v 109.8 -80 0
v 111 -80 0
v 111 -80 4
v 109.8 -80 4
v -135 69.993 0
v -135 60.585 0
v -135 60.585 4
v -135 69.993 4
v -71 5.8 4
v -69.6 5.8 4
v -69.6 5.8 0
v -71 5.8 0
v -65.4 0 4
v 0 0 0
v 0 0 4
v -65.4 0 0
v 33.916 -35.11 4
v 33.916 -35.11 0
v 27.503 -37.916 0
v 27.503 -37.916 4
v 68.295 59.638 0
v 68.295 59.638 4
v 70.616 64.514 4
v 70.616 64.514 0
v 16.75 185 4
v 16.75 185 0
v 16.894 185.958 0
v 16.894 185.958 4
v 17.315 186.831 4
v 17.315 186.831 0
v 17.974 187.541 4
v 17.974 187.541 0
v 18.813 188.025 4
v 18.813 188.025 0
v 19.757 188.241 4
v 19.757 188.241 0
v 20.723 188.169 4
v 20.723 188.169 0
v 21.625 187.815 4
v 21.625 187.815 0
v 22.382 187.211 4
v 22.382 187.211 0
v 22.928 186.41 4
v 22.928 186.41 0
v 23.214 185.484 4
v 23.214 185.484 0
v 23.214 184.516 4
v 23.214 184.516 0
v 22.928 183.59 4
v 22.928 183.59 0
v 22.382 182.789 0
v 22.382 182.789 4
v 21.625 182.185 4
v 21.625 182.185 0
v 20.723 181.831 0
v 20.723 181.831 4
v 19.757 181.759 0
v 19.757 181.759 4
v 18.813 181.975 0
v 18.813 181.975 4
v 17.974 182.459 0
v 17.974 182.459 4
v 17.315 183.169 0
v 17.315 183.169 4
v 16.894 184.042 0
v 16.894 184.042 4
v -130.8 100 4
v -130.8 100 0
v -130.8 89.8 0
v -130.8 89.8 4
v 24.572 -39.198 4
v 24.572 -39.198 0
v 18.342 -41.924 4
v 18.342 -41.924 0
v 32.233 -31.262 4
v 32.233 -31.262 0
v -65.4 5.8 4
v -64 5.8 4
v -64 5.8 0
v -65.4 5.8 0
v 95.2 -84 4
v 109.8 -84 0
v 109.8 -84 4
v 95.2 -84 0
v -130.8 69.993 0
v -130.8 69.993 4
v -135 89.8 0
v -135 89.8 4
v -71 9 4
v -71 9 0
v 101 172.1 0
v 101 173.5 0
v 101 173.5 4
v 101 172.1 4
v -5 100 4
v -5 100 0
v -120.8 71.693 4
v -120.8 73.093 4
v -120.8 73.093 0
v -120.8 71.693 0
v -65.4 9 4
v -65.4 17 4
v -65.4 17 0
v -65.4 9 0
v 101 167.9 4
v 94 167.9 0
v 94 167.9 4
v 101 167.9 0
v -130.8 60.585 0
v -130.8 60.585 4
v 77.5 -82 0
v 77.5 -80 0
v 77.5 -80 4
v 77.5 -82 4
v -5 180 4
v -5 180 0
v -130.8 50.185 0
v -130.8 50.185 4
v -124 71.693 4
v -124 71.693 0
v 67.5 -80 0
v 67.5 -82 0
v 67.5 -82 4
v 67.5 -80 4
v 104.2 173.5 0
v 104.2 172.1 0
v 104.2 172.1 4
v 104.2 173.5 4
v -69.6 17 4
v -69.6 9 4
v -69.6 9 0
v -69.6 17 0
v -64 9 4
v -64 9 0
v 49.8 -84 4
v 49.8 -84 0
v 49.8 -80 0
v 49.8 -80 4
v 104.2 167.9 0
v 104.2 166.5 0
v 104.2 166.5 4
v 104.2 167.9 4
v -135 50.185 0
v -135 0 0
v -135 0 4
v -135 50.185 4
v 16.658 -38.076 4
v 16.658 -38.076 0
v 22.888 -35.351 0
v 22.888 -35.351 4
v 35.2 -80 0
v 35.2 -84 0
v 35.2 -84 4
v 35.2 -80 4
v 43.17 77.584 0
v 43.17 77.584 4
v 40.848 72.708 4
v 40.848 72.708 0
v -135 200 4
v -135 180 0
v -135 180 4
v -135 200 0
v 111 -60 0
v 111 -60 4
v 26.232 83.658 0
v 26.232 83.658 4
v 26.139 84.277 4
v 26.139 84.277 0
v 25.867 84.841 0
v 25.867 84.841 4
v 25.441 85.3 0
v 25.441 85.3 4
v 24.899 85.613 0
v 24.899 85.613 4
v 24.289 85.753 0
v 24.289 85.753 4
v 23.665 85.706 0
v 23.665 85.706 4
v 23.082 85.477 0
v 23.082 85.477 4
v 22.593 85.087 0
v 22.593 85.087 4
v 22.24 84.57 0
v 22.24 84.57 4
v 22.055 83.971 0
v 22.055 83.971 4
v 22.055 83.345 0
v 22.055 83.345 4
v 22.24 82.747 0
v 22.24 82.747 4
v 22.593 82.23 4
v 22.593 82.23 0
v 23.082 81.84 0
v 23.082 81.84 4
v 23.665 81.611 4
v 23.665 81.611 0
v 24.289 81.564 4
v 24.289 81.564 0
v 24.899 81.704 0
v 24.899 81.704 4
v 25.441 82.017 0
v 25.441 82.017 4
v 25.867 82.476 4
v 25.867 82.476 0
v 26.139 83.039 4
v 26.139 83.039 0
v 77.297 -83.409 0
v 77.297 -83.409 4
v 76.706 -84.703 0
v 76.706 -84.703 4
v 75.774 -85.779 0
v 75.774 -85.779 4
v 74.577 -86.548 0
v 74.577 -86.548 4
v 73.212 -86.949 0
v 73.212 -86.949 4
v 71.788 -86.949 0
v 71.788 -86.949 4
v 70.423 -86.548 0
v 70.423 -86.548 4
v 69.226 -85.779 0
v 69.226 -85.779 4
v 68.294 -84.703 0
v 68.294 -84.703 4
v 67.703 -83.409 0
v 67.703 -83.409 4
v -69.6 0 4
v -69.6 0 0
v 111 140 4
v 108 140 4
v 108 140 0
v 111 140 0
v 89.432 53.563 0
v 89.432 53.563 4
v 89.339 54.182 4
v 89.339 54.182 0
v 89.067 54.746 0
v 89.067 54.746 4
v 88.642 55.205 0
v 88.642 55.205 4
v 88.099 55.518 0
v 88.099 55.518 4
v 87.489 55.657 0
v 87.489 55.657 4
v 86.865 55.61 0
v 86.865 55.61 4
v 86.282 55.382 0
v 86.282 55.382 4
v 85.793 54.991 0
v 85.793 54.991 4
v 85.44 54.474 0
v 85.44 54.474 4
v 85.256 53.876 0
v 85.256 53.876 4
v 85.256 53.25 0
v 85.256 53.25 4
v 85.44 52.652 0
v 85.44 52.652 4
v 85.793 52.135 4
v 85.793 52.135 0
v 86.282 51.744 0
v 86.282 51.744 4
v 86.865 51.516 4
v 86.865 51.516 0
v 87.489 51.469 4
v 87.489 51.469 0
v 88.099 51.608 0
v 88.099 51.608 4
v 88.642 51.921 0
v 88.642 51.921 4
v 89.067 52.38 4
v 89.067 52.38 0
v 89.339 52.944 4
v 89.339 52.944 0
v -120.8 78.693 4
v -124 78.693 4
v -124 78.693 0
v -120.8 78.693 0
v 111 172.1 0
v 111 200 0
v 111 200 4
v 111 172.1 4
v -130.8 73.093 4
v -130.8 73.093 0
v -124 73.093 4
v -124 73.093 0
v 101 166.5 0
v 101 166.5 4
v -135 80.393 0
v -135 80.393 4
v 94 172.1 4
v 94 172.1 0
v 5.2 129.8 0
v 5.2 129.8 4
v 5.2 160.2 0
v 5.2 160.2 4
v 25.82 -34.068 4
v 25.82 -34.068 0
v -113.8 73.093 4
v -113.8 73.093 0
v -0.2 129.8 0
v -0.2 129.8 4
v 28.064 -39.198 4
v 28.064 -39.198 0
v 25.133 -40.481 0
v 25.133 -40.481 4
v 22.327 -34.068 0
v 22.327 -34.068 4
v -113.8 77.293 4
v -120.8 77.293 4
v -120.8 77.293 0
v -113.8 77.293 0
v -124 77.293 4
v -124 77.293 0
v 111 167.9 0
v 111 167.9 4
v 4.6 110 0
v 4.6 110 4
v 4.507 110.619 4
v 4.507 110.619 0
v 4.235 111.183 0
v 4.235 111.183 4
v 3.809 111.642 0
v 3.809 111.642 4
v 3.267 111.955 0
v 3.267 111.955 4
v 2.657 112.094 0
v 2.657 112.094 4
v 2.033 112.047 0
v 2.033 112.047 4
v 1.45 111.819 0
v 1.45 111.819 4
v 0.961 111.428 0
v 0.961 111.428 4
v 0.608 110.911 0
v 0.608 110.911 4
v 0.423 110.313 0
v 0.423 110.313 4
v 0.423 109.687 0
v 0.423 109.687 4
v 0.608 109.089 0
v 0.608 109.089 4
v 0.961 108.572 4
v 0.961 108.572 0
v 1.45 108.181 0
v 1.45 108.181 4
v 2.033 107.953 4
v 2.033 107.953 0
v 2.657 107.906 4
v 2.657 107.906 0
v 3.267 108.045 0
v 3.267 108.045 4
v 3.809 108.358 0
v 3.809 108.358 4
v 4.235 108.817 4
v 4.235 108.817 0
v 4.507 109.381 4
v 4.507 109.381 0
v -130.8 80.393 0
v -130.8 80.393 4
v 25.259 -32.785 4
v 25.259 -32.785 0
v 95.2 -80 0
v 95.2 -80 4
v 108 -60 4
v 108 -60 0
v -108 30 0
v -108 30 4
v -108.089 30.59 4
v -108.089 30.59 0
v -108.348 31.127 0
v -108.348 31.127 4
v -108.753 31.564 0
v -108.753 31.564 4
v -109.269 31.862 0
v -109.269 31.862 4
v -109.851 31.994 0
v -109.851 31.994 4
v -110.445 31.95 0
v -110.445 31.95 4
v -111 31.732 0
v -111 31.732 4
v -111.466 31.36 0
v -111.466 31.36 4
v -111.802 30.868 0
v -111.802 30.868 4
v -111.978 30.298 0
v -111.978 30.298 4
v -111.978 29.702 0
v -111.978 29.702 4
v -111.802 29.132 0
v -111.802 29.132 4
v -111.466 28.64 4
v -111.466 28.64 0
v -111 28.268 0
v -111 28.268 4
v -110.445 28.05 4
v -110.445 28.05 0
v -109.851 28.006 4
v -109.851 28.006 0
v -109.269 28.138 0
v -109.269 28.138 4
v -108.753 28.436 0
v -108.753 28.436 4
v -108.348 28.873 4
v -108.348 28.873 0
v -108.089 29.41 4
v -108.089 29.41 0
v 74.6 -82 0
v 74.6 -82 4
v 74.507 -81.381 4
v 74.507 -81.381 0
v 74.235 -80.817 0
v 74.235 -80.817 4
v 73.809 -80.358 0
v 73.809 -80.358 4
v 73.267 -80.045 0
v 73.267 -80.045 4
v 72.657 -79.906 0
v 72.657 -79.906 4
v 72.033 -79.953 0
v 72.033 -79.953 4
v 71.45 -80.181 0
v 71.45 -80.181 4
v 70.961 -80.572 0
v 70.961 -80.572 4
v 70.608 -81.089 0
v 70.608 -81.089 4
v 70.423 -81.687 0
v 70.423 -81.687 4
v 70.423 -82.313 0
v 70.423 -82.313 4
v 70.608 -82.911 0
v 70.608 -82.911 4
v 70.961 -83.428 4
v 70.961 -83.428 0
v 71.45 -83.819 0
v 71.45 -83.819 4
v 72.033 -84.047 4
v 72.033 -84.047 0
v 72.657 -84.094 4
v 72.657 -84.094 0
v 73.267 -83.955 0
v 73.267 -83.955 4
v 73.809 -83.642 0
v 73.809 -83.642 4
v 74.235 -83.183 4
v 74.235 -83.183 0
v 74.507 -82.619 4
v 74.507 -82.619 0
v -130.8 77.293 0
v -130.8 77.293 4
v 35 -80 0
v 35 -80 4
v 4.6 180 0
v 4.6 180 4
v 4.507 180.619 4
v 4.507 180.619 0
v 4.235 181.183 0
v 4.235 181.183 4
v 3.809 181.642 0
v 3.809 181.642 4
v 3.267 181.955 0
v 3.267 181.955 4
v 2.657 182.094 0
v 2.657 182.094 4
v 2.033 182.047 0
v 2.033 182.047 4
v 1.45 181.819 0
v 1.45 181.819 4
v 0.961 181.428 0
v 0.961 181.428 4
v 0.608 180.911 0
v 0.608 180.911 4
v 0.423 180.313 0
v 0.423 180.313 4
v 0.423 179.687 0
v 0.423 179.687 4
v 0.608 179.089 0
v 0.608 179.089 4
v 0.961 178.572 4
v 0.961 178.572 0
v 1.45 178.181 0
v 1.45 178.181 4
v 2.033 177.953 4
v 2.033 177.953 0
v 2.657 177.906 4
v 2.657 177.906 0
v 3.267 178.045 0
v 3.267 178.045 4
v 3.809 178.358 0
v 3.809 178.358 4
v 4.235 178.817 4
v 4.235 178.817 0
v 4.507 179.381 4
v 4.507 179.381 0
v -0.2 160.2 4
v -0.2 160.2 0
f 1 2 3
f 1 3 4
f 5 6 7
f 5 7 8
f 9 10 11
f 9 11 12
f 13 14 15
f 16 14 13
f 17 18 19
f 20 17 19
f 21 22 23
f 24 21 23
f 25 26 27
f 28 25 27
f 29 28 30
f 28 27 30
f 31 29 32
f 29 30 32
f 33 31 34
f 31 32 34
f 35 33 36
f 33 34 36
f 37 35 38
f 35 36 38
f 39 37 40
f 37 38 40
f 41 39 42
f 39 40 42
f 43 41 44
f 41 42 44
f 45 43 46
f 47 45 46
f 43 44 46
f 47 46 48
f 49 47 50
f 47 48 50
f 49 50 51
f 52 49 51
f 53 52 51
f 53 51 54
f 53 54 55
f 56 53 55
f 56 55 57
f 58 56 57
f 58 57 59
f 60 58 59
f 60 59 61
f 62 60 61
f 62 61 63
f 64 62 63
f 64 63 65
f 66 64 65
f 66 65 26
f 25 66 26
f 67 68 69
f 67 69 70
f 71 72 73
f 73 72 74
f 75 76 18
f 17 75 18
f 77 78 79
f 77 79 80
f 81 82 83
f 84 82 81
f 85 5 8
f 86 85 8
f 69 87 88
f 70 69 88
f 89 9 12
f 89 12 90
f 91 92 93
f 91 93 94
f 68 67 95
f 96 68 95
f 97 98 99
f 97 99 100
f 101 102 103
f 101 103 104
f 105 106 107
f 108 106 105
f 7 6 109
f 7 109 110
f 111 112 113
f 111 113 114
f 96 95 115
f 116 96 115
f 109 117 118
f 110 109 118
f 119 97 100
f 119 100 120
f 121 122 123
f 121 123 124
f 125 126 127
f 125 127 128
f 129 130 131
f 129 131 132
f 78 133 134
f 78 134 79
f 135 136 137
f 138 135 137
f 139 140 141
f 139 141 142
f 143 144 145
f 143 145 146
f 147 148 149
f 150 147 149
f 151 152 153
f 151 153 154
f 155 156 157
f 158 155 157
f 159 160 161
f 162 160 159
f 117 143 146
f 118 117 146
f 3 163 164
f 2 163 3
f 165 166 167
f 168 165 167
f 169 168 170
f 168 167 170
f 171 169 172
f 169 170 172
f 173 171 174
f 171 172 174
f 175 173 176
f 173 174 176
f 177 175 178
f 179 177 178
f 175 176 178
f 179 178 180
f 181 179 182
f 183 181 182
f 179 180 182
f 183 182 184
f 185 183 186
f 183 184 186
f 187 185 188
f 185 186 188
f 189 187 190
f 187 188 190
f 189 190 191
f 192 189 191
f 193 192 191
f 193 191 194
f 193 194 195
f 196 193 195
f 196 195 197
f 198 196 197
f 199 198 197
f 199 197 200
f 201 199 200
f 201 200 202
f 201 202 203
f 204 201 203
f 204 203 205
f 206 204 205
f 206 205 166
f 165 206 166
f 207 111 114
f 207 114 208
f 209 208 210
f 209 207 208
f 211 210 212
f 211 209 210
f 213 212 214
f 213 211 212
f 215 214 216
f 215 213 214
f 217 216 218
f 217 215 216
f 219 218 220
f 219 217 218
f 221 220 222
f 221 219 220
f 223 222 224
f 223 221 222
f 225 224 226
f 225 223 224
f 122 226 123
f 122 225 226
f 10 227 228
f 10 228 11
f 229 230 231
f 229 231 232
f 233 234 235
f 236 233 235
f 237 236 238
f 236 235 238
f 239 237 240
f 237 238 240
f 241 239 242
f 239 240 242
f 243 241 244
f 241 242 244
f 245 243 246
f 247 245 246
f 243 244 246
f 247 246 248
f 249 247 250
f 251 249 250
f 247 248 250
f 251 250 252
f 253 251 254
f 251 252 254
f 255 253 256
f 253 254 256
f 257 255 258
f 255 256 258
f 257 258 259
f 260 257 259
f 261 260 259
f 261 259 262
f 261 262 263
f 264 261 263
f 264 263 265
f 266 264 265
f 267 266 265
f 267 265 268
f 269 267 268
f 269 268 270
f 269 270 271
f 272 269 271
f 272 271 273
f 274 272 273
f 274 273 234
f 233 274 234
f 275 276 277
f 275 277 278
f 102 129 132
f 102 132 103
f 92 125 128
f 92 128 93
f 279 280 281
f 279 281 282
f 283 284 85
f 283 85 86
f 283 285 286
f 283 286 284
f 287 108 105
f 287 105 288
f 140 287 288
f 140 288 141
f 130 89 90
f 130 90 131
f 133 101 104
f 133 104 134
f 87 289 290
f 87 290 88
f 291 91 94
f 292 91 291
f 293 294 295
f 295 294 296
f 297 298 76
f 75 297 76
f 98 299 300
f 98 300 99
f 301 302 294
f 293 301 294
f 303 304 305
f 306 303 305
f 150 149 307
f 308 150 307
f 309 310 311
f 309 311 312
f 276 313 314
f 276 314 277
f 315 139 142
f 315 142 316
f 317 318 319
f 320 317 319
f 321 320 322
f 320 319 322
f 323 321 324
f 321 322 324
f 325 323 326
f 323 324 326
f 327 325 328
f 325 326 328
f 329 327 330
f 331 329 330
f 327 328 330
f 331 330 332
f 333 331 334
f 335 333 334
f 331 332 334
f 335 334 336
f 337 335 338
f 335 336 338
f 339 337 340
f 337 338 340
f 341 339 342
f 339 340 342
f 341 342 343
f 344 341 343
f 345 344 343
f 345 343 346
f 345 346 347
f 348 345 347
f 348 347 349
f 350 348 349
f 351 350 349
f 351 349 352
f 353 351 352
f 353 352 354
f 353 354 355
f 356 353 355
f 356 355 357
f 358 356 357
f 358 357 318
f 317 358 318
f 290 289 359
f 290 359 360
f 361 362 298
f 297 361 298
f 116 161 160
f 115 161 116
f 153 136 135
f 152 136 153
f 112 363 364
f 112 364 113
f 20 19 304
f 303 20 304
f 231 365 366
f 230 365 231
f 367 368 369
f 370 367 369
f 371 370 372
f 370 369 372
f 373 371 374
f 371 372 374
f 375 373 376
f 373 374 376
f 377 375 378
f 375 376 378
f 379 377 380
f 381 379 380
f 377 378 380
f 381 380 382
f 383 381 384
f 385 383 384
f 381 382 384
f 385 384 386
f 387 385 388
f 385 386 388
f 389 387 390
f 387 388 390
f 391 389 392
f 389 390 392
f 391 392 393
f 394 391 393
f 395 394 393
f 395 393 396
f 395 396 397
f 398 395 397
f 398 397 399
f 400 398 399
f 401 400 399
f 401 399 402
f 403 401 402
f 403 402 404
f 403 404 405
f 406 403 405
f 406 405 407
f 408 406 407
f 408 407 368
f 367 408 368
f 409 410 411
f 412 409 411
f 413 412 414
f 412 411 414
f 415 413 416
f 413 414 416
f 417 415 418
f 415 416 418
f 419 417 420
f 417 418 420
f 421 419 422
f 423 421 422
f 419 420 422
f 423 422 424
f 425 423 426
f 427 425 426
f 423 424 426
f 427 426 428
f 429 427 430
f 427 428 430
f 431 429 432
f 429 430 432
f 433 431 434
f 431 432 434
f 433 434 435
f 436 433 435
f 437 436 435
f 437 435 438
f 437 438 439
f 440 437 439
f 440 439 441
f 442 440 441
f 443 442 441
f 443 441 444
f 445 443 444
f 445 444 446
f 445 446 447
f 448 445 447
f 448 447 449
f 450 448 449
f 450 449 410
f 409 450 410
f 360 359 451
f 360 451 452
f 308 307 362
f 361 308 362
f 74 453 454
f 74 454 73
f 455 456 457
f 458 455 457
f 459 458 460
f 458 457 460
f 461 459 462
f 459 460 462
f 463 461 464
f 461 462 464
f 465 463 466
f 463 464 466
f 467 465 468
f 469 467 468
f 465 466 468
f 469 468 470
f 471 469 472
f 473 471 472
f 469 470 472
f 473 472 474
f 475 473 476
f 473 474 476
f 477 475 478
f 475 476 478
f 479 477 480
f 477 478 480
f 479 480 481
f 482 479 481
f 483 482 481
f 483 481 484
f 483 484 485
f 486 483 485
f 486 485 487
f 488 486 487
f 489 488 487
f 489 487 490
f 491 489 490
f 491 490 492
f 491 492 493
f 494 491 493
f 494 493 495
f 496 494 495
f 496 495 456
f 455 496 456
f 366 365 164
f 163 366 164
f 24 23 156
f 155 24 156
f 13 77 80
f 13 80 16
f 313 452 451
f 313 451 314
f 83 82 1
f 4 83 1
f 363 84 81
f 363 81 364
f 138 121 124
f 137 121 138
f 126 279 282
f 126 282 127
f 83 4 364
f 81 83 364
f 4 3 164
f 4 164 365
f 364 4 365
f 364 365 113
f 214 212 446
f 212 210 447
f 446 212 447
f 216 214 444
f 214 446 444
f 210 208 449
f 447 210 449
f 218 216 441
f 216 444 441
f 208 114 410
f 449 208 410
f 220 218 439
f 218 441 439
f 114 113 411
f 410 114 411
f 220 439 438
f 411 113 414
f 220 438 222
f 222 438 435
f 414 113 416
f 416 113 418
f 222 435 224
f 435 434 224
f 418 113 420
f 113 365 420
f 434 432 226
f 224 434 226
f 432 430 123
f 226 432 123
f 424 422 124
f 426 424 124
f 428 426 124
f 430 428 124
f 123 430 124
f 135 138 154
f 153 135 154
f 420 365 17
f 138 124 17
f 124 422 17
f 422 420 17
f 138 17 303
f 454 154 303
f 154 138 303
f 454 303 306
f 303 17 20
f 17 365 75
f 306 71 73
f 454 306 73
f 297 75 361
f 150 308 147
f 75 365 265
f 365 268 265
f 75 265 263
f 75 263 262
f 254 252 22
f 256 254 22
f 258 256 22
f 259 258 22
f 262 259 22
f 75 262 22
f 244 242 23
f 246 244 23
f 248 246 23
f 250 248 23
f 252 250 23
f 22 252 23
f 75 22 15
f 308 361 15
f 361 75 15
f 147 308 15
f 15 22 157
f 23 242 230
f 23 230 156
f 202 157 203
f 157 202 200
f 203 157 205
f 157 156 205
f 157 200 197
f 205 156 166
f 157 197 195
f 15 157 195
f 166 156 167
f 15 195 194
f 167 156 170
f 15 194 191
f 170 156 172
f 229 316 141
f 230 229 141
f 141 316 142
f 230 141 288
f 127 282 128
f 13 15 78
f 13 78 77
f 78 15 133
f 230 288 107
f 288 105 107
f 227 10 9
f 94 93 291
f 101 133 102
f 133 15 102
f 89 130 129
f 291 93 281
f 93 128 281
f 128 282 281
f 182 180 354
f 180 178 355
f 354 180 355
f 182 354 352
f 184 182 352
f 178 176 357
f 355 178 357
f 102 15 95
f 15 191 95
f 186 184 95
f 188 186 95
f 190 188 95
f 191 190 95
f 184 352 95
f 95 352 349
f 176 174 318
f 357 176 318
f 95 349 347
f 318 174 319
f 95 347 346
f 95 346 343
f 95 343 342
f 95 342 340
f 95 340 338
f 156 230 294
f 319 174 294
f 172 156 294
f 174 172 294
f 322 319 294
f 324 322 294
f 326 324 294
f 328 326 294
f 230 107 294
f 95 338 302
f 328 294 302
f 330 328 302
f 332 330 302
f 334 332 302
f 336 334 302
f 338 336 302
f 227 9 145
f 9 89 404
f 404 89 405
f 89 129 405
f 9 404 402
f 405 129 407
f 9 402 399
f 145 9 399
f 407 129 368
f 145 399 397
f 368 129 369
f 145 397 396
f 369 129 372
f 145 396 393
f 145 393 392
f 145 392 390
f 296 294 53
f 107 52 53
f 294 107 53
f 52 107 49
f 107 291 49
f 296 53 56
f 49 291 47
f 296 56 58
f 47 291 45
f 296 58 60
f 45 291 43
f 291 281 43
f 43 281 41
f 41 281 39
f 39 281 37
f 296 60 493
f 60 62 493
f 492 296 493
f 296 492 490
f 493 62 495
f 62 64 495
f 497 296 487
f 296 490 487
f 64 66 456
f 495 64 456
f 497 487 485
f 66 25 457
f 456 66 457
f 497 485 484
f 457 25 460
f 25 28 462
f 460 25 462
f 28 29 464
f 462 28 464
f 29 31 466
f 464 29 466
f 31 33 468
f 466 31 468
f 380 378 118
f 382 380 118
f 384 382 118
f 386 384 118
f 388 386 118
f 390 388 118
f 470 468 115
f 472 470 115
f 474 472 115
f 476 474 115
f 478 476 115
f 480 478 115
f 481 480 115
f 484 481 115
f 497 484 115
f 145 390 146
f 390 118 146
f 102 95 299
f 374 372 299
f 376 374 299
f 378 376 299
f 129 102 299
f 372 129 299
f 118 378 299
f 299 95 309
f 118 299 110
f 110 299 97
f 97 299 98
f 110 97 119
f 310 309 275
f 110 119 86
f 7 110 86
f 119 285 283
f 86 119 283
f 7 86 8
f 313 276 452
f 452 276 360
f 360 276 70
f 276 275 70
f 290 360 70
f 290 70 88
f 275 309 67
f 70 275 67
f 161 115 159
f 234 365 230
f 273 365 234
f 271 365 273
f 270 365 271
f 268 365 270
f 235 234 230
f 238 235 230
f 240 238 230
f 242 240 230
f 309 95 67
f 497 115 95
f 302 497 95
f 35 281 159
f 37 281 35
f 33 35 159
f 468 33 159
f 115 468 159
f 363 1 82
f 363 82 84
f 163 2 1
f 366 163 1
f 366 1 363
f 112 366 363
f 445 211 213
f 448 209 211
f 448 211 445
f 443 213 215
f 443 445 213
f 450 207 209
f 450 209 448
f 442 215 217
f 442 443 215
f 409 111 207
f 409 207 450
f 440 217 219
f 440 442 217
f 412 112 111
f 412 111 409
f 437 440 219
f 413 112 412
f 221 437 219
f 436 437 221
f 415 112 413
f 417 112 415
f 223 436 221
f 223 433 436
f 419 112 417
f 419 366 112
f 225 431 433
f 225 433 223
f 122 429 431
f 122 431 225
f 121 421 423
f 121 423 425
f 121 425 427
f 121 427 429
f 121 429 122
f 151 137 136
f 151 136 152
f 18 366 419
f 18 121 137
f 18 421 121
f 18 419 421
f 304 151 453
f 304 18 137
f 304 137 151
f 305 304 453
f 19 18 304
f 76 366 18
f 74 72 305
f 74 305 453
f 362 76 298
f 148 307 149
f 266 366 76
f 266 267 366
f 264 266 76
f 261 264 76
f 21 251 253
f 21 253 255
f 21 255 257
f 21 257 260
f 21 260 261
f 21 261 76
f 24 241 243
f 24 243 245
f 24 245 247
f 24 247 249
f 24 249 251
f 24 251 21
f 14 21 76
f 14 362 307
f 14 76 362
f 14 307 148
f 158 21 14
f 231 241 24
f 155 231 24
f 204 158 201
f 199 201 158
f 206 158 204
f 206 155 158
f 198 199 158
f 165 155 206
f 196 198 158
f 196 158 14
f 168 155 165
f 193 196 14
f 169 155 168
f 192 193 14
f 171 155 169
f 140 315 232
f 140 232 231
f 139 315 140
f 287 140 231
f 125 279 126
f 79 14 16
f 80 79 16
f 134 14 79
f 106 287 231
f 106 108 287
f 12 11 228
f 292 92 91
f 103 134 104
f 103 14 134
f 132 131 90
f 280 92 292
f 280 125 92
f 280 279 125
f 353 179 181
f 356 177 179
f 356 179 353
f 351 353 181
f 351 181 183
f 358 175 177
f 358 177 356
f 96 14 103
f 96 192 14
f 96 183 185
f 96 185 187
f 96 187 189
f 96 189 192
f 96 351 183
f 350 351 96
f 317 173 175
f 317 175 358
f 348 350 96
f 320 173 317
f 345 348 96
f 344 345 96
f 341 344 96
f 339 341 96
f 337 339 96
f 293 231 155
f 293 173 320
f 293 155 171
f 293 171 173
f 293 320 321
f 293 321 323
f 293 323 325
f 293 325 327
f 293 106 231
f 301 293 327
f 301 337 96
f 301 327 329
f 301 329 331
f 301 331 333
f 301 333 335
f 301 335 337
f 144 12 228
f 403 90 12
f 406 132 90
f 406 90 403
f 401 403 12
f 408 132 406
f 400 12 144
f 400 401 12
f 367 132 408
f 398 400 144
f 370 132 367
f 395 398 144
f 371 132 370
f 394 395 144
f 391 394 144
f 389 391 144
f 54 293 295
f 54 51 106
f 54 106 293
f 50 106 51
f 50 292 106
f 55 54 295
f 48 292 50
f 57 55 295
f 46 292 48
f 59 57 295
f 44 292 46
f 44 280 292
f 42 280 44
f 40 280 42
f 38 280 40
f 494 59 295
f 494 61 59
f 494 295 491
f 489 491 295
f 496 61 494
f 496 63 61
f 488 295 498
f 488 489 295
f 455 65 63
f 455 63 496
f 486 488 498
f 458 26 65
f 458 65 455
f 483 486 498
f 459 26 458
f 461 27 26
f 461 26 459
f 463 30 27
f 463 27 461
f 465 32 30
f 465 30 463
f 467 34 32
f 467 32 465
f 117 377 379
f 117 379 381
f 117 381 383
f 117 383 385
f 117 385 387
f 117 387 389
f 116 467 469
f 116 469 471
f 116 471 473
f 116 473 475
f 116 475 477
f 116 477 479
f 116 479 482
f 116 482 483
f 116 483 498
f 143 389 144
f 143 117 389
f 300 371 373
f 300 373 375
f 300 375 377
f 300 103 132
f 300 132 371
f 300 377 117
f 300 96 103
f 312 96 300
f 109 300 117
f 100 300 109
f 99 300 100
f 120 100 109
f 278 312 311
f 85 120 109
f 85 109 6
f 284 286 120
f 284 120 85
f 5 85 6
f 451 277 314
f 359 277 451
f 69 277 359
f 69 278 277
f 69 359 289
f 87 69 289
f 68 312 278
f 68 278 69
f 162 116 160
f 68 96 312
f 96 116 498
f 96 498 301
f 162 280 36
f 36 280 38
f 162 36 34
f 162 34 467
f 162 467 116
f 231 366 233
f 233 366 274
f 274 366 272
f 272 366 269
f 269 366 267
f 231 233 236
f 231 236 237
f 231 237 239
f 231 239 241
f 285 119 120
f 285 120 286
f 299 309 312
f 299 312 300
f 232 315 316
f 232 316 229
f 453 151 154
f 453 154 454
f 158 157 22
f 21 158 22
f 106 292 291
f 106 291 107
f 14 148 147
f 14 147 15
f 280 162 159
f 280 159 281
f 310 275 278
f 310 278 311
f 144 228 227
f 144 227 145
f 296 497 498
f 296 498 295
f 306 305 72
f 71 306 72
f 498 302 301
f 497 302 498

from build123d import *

# Parameters (mm, degrees)
BOSS_EXTRU_1_DEPTH       = 4
ESQUISSE2_W              = 130
ESQUISSE2_H              = 80
ENL_V_MAT_EXTRU_1_DEPTH  = 242.33172191
ESQUISSE3_W              = 3
ESQUISSE3_H              = 200
ENL_V_MAT_EXTRU_2_DEPTH  = 242.33172191
ESQUISSE4_R              = 2.1
ENL_V_MAT_EXTRU_3_DEPTH  = 242.33172191
ESQUISSE5_R              = 2
ENL_V_MAT_EXTRU_4_DEPTH  = 242.33172191
ESQUISSE7_R              = 3.25
ENL_V_MAT_EXTRU_6_DEPTH  = 242.33172191
ESQUISSE8_W              = 5.4
ESQUISSE8_H              = 30.4
ENL_V_MAT_EXTRU_7_DEPTH  = 242.33172191
ESQUISSE9_W              = 4.4
ESQUISSE9_H              = 10.4
ENL_V_MAT_EXTRU_8_DEPTH  = 4.2
ENL_V_MAT_EXTRU_9_DEPTH  = 242.33172191
ESQUISSE12_W             = 14.6
ESQUISSE12_H             = 4
BOSS_EXTRU_2_DEPTH       = 4
ENL_V_MAT_EXTRU_10_DEPTH = 242.33172191
ENL_V_MAT_EXTRU_11_DEPTH = 242.33172191
ENL_V_MAT_EXTRU_12_DEPTH = 242.33172191
ESQUISSE16_R             = 2.1
ENL_V_MAT_EXTRU_13_DEPTH = 242.33172191


with BuildPart() as part:
    # Esquisse1 → Boss.-Extru.1 (new body)
    with BuildSketch(Plane.XY):
        Polygon((0, 0), (-135, 0), (-135, 200), (111, 200), (111, -80), (35, -80), align=None)
    extrude(amount=BOSS_EXTRU_1_DEPTH)

    # Esquisse2 → Enlèv. mat.-Extru.1 (cut, through all)
    with BuildSketch(Plane.XY.offset(4)):
        with Locations((-70, 140)):
            Rectangle(ESQUISSE2_W, ESQUISSE2_H)
    extrude(amount=-ENL_V_MAT_EXTRU_1_DEPTH, mode=Mode.SUBTRACT)

    # Esquisse3 → Enlèv. mat.-Extru.2 (cut, through all)
    with BuildSketch(Plane.XY.offset(4)):
        with Locations((109.5, 40)):
            Rectangle(ESQUISSE3_W, ESQUISSE3_H)
    extrude(amount=-ENL_V_MAT_EXTRU_2_DEPTH, mode=Mode.SUBTRACT)

    # Esquisse4 → Enlèv. mat.-Extru.3 (cut, through all)
    with BuildSketch(Plane.XY.offset(4)):
        with Locations((24.132044328, 83.658479689)):
            Circle(ESQUISSE4_R)
        with Locations((87.332280645, 53.563129062)):
            Circle(ESQUISSE4_R)
        with Locations((2.5, 110)):
            Circle(ESQUISSE4_R)
        with Locations((2.5, 180)):
            Circle(ESQUISSE4_R)
    extrude(amount=-ENL_V_MAT_EXTRU_3_DEPTH, mode=Mode.SUBTRACT)

    # Esquisse5 → Enlèv. mat.-Extru.4 (cut, through all)
    with BuildSketch(Plane.XY.offset(4)):
        with Locations((-110, 30)):
            Circle(ESQUISSE5_R)
    extrude(amount=-ENL_V_MAT_EXTRU_4_DEPTH, mode=Mode.SUBTRACT)

    # Esquisse7 → Enlèv. mat.-Extru.6 (cut, through all)
    with BuildSketch(Plane(origin=(0, 0, 0), x_dir=(-1, 0, 0), z_dir=(0, 0, -1))):
        with Locations((-20, 185)):
            Circle(ESQUISSE7_R)
    extrude(amount=-ENL_V_MAT_EXTRU_6_DEPTH, mode=Mode.SUBTRACT)

    # Esquisse8 → Enlèv. mat.-Extru.7 (cut, through all)
    with BuildSketch(Plane.XY.offset(4)):
        with Locations((2.5, 145)):
            Rectangle(ESQUISSE8_W, ESQUISSE8_H)
        Polygon((68.294821705, 59.638090553), (70.616463039, 64.513537354), (43.169503267, 77.583518198), (40.847861933, 72.708071397), align=None)
    extrude(amount=-ENL_V_MAT_EXTRU_7_DEPTH, mode=Mode.SUBTRACT)

    # Esquisse9 → Enlèv. mat.-Extru.8 (cut)
    with BuildSketch(Plane.ZY.offset(135)):
        with Locations((2, 95)):
            Rectangle(ESQUISSE9_W, ESQUISSE9_H)
        with Locations((2, 55.385186032)):
            Rectangle(ESQUISSE9_W, ESQUISSE9_H)
        with Locations((2, 75.192593016)):
            Rectangle(ESQUISSE9_W, ESQUISSE9_H)
    extrude(amount=-ENL_V_MAT_EXTRU_8_DEPTH, mode=Mode.SUBTRACT)

    # Esquisse10 → Enlèv. mat.-Extru.9 (cut, through all)
    with BuildSketch(Plane.XY.offset(4)):
        Polygon((-130.8, 77.292593016), (-124, 77.292593016), (-124, 78.692593016), (-120.8, 78.692593016), (-120.8, 77.292593016), (-113.8, 77.292593016), (-113.8, 73.092593016), (-120.8, 73.092593016), (-120.8, 71.692593016), (-124, 71.692593016), (-124, 73.092593016), (-130.8, 73.092593016), align=None)
    extrude(amount=-ENL_V_MAT_EXTRU_9_DEPTH, mode=Mode.SUBTRACT)

    # Esquisse12 → Boss.-Extru.2 (add)
    with BuildSketch(Plane(origin=(0, 0, 0), x_dir=(-1, 0, 0), z_dir=(0, 0, -1))):
        with Locations((-42.5, -82)):
            Rectangle(ESQUISSE12_W, ESQUISSE12_H)
        with Locations((-102.5, -82)):
            Rectangle(ESQUISSE12_W, ESQUISSE12_H)
        with BuildLine():
            Line((-67.5, -82), (-67.5, -80))
            Line((-67.5, -80), (-77.5, -80))
            Line((-77.5, -80), (-77.5, -82))
            ThreePointArc((-77.5, -82), (-72.5, -87), (-67.5, -82))
        make_face()
    extrude(amount=-BOSS_EXTRU_2_DEPTH)

    # Esquisse13 → Enlèv. mat.-Extru.10 (cut, through all)
    with BuildSketch(Plane(origin=(0, 0, 0), x_dir=(-1, 0, 0), z_dir=(0, 0, -1))):
        Polygon((-18.341719551, -41.923930403), (-16.658280449, -38.076069597), (-22.888150326, -35.350501525), (-22.327003958, -34.067881257), (-25.25870743, -32.785260988), (-25.819853798, -34.067881257), (-32.232955142, -31.262149418), (-33.916394245, -35.110010225), (-27.5032929, -37.915742063), (-28.064439268, -39.198362332), (-25.132735796, -40.480982601), (-24.571589429, -39.198362332), align=None)
    extrude(amount=-ENL_V_MAT_EXTRU_10_DEPTH, mode=Mode.SUBTRACT)

    # Esquisse14 → Enlèv. mat.-Extru.11 (cut, through all)
    with BuildSketch(Plane(origin=(0, 0, 0), x_dir=(-1, 0, 0), z_dir=(0, 0, -1))):
        Polygon((-104.2, 172.1), (-104.2, 173.5), (-101, 173.5), (-101, 172.1), (-94, 172.1), (-94, 167.9), (-101, 167.9), (-101, 166.5), (-104.2, 166.5), (-104.2, 167.9), (-111, 167.9), (-111, 172.1), align=None)
    extrude(amount=-ENL_V_MAT_EXTRU_11_DEPTH, mode=Mode.SUBTRACT)

    # Esquisse15 → Enlèv. mat.-Extru.12 (cut, through all)
    with BuildSketch(Plane.XY.offset(4)):
        Polygon((-69.6, 17), (-65.4, 17), (-65.4, 9), (-64, 9), (-64, 5.8), (-65.4, 5.8), (-65.4, 0), (-69.6, 0), (-69.6, 5.8), (-71, 5.8), (-71, 9), (-69.6, 9), align=None)
    extrude(amount=-ENL_V_MAT_EXTRU_12_DEPTH, mode=Mode.SUBTRACT)

    # Esquisse16 → Enlèv. mat.-Extru.13 (cut, through all)
    with BuildSketch(Plane.XY.offset(4)):
        with Locations((72.5, -82)):
            Circle(ESQUISSE16_R)
    extrude(amount=-ENL_V_MAT_EXTRU_13_DEPTH, mode=Mode.SUBTRACT)


solid = part.part
